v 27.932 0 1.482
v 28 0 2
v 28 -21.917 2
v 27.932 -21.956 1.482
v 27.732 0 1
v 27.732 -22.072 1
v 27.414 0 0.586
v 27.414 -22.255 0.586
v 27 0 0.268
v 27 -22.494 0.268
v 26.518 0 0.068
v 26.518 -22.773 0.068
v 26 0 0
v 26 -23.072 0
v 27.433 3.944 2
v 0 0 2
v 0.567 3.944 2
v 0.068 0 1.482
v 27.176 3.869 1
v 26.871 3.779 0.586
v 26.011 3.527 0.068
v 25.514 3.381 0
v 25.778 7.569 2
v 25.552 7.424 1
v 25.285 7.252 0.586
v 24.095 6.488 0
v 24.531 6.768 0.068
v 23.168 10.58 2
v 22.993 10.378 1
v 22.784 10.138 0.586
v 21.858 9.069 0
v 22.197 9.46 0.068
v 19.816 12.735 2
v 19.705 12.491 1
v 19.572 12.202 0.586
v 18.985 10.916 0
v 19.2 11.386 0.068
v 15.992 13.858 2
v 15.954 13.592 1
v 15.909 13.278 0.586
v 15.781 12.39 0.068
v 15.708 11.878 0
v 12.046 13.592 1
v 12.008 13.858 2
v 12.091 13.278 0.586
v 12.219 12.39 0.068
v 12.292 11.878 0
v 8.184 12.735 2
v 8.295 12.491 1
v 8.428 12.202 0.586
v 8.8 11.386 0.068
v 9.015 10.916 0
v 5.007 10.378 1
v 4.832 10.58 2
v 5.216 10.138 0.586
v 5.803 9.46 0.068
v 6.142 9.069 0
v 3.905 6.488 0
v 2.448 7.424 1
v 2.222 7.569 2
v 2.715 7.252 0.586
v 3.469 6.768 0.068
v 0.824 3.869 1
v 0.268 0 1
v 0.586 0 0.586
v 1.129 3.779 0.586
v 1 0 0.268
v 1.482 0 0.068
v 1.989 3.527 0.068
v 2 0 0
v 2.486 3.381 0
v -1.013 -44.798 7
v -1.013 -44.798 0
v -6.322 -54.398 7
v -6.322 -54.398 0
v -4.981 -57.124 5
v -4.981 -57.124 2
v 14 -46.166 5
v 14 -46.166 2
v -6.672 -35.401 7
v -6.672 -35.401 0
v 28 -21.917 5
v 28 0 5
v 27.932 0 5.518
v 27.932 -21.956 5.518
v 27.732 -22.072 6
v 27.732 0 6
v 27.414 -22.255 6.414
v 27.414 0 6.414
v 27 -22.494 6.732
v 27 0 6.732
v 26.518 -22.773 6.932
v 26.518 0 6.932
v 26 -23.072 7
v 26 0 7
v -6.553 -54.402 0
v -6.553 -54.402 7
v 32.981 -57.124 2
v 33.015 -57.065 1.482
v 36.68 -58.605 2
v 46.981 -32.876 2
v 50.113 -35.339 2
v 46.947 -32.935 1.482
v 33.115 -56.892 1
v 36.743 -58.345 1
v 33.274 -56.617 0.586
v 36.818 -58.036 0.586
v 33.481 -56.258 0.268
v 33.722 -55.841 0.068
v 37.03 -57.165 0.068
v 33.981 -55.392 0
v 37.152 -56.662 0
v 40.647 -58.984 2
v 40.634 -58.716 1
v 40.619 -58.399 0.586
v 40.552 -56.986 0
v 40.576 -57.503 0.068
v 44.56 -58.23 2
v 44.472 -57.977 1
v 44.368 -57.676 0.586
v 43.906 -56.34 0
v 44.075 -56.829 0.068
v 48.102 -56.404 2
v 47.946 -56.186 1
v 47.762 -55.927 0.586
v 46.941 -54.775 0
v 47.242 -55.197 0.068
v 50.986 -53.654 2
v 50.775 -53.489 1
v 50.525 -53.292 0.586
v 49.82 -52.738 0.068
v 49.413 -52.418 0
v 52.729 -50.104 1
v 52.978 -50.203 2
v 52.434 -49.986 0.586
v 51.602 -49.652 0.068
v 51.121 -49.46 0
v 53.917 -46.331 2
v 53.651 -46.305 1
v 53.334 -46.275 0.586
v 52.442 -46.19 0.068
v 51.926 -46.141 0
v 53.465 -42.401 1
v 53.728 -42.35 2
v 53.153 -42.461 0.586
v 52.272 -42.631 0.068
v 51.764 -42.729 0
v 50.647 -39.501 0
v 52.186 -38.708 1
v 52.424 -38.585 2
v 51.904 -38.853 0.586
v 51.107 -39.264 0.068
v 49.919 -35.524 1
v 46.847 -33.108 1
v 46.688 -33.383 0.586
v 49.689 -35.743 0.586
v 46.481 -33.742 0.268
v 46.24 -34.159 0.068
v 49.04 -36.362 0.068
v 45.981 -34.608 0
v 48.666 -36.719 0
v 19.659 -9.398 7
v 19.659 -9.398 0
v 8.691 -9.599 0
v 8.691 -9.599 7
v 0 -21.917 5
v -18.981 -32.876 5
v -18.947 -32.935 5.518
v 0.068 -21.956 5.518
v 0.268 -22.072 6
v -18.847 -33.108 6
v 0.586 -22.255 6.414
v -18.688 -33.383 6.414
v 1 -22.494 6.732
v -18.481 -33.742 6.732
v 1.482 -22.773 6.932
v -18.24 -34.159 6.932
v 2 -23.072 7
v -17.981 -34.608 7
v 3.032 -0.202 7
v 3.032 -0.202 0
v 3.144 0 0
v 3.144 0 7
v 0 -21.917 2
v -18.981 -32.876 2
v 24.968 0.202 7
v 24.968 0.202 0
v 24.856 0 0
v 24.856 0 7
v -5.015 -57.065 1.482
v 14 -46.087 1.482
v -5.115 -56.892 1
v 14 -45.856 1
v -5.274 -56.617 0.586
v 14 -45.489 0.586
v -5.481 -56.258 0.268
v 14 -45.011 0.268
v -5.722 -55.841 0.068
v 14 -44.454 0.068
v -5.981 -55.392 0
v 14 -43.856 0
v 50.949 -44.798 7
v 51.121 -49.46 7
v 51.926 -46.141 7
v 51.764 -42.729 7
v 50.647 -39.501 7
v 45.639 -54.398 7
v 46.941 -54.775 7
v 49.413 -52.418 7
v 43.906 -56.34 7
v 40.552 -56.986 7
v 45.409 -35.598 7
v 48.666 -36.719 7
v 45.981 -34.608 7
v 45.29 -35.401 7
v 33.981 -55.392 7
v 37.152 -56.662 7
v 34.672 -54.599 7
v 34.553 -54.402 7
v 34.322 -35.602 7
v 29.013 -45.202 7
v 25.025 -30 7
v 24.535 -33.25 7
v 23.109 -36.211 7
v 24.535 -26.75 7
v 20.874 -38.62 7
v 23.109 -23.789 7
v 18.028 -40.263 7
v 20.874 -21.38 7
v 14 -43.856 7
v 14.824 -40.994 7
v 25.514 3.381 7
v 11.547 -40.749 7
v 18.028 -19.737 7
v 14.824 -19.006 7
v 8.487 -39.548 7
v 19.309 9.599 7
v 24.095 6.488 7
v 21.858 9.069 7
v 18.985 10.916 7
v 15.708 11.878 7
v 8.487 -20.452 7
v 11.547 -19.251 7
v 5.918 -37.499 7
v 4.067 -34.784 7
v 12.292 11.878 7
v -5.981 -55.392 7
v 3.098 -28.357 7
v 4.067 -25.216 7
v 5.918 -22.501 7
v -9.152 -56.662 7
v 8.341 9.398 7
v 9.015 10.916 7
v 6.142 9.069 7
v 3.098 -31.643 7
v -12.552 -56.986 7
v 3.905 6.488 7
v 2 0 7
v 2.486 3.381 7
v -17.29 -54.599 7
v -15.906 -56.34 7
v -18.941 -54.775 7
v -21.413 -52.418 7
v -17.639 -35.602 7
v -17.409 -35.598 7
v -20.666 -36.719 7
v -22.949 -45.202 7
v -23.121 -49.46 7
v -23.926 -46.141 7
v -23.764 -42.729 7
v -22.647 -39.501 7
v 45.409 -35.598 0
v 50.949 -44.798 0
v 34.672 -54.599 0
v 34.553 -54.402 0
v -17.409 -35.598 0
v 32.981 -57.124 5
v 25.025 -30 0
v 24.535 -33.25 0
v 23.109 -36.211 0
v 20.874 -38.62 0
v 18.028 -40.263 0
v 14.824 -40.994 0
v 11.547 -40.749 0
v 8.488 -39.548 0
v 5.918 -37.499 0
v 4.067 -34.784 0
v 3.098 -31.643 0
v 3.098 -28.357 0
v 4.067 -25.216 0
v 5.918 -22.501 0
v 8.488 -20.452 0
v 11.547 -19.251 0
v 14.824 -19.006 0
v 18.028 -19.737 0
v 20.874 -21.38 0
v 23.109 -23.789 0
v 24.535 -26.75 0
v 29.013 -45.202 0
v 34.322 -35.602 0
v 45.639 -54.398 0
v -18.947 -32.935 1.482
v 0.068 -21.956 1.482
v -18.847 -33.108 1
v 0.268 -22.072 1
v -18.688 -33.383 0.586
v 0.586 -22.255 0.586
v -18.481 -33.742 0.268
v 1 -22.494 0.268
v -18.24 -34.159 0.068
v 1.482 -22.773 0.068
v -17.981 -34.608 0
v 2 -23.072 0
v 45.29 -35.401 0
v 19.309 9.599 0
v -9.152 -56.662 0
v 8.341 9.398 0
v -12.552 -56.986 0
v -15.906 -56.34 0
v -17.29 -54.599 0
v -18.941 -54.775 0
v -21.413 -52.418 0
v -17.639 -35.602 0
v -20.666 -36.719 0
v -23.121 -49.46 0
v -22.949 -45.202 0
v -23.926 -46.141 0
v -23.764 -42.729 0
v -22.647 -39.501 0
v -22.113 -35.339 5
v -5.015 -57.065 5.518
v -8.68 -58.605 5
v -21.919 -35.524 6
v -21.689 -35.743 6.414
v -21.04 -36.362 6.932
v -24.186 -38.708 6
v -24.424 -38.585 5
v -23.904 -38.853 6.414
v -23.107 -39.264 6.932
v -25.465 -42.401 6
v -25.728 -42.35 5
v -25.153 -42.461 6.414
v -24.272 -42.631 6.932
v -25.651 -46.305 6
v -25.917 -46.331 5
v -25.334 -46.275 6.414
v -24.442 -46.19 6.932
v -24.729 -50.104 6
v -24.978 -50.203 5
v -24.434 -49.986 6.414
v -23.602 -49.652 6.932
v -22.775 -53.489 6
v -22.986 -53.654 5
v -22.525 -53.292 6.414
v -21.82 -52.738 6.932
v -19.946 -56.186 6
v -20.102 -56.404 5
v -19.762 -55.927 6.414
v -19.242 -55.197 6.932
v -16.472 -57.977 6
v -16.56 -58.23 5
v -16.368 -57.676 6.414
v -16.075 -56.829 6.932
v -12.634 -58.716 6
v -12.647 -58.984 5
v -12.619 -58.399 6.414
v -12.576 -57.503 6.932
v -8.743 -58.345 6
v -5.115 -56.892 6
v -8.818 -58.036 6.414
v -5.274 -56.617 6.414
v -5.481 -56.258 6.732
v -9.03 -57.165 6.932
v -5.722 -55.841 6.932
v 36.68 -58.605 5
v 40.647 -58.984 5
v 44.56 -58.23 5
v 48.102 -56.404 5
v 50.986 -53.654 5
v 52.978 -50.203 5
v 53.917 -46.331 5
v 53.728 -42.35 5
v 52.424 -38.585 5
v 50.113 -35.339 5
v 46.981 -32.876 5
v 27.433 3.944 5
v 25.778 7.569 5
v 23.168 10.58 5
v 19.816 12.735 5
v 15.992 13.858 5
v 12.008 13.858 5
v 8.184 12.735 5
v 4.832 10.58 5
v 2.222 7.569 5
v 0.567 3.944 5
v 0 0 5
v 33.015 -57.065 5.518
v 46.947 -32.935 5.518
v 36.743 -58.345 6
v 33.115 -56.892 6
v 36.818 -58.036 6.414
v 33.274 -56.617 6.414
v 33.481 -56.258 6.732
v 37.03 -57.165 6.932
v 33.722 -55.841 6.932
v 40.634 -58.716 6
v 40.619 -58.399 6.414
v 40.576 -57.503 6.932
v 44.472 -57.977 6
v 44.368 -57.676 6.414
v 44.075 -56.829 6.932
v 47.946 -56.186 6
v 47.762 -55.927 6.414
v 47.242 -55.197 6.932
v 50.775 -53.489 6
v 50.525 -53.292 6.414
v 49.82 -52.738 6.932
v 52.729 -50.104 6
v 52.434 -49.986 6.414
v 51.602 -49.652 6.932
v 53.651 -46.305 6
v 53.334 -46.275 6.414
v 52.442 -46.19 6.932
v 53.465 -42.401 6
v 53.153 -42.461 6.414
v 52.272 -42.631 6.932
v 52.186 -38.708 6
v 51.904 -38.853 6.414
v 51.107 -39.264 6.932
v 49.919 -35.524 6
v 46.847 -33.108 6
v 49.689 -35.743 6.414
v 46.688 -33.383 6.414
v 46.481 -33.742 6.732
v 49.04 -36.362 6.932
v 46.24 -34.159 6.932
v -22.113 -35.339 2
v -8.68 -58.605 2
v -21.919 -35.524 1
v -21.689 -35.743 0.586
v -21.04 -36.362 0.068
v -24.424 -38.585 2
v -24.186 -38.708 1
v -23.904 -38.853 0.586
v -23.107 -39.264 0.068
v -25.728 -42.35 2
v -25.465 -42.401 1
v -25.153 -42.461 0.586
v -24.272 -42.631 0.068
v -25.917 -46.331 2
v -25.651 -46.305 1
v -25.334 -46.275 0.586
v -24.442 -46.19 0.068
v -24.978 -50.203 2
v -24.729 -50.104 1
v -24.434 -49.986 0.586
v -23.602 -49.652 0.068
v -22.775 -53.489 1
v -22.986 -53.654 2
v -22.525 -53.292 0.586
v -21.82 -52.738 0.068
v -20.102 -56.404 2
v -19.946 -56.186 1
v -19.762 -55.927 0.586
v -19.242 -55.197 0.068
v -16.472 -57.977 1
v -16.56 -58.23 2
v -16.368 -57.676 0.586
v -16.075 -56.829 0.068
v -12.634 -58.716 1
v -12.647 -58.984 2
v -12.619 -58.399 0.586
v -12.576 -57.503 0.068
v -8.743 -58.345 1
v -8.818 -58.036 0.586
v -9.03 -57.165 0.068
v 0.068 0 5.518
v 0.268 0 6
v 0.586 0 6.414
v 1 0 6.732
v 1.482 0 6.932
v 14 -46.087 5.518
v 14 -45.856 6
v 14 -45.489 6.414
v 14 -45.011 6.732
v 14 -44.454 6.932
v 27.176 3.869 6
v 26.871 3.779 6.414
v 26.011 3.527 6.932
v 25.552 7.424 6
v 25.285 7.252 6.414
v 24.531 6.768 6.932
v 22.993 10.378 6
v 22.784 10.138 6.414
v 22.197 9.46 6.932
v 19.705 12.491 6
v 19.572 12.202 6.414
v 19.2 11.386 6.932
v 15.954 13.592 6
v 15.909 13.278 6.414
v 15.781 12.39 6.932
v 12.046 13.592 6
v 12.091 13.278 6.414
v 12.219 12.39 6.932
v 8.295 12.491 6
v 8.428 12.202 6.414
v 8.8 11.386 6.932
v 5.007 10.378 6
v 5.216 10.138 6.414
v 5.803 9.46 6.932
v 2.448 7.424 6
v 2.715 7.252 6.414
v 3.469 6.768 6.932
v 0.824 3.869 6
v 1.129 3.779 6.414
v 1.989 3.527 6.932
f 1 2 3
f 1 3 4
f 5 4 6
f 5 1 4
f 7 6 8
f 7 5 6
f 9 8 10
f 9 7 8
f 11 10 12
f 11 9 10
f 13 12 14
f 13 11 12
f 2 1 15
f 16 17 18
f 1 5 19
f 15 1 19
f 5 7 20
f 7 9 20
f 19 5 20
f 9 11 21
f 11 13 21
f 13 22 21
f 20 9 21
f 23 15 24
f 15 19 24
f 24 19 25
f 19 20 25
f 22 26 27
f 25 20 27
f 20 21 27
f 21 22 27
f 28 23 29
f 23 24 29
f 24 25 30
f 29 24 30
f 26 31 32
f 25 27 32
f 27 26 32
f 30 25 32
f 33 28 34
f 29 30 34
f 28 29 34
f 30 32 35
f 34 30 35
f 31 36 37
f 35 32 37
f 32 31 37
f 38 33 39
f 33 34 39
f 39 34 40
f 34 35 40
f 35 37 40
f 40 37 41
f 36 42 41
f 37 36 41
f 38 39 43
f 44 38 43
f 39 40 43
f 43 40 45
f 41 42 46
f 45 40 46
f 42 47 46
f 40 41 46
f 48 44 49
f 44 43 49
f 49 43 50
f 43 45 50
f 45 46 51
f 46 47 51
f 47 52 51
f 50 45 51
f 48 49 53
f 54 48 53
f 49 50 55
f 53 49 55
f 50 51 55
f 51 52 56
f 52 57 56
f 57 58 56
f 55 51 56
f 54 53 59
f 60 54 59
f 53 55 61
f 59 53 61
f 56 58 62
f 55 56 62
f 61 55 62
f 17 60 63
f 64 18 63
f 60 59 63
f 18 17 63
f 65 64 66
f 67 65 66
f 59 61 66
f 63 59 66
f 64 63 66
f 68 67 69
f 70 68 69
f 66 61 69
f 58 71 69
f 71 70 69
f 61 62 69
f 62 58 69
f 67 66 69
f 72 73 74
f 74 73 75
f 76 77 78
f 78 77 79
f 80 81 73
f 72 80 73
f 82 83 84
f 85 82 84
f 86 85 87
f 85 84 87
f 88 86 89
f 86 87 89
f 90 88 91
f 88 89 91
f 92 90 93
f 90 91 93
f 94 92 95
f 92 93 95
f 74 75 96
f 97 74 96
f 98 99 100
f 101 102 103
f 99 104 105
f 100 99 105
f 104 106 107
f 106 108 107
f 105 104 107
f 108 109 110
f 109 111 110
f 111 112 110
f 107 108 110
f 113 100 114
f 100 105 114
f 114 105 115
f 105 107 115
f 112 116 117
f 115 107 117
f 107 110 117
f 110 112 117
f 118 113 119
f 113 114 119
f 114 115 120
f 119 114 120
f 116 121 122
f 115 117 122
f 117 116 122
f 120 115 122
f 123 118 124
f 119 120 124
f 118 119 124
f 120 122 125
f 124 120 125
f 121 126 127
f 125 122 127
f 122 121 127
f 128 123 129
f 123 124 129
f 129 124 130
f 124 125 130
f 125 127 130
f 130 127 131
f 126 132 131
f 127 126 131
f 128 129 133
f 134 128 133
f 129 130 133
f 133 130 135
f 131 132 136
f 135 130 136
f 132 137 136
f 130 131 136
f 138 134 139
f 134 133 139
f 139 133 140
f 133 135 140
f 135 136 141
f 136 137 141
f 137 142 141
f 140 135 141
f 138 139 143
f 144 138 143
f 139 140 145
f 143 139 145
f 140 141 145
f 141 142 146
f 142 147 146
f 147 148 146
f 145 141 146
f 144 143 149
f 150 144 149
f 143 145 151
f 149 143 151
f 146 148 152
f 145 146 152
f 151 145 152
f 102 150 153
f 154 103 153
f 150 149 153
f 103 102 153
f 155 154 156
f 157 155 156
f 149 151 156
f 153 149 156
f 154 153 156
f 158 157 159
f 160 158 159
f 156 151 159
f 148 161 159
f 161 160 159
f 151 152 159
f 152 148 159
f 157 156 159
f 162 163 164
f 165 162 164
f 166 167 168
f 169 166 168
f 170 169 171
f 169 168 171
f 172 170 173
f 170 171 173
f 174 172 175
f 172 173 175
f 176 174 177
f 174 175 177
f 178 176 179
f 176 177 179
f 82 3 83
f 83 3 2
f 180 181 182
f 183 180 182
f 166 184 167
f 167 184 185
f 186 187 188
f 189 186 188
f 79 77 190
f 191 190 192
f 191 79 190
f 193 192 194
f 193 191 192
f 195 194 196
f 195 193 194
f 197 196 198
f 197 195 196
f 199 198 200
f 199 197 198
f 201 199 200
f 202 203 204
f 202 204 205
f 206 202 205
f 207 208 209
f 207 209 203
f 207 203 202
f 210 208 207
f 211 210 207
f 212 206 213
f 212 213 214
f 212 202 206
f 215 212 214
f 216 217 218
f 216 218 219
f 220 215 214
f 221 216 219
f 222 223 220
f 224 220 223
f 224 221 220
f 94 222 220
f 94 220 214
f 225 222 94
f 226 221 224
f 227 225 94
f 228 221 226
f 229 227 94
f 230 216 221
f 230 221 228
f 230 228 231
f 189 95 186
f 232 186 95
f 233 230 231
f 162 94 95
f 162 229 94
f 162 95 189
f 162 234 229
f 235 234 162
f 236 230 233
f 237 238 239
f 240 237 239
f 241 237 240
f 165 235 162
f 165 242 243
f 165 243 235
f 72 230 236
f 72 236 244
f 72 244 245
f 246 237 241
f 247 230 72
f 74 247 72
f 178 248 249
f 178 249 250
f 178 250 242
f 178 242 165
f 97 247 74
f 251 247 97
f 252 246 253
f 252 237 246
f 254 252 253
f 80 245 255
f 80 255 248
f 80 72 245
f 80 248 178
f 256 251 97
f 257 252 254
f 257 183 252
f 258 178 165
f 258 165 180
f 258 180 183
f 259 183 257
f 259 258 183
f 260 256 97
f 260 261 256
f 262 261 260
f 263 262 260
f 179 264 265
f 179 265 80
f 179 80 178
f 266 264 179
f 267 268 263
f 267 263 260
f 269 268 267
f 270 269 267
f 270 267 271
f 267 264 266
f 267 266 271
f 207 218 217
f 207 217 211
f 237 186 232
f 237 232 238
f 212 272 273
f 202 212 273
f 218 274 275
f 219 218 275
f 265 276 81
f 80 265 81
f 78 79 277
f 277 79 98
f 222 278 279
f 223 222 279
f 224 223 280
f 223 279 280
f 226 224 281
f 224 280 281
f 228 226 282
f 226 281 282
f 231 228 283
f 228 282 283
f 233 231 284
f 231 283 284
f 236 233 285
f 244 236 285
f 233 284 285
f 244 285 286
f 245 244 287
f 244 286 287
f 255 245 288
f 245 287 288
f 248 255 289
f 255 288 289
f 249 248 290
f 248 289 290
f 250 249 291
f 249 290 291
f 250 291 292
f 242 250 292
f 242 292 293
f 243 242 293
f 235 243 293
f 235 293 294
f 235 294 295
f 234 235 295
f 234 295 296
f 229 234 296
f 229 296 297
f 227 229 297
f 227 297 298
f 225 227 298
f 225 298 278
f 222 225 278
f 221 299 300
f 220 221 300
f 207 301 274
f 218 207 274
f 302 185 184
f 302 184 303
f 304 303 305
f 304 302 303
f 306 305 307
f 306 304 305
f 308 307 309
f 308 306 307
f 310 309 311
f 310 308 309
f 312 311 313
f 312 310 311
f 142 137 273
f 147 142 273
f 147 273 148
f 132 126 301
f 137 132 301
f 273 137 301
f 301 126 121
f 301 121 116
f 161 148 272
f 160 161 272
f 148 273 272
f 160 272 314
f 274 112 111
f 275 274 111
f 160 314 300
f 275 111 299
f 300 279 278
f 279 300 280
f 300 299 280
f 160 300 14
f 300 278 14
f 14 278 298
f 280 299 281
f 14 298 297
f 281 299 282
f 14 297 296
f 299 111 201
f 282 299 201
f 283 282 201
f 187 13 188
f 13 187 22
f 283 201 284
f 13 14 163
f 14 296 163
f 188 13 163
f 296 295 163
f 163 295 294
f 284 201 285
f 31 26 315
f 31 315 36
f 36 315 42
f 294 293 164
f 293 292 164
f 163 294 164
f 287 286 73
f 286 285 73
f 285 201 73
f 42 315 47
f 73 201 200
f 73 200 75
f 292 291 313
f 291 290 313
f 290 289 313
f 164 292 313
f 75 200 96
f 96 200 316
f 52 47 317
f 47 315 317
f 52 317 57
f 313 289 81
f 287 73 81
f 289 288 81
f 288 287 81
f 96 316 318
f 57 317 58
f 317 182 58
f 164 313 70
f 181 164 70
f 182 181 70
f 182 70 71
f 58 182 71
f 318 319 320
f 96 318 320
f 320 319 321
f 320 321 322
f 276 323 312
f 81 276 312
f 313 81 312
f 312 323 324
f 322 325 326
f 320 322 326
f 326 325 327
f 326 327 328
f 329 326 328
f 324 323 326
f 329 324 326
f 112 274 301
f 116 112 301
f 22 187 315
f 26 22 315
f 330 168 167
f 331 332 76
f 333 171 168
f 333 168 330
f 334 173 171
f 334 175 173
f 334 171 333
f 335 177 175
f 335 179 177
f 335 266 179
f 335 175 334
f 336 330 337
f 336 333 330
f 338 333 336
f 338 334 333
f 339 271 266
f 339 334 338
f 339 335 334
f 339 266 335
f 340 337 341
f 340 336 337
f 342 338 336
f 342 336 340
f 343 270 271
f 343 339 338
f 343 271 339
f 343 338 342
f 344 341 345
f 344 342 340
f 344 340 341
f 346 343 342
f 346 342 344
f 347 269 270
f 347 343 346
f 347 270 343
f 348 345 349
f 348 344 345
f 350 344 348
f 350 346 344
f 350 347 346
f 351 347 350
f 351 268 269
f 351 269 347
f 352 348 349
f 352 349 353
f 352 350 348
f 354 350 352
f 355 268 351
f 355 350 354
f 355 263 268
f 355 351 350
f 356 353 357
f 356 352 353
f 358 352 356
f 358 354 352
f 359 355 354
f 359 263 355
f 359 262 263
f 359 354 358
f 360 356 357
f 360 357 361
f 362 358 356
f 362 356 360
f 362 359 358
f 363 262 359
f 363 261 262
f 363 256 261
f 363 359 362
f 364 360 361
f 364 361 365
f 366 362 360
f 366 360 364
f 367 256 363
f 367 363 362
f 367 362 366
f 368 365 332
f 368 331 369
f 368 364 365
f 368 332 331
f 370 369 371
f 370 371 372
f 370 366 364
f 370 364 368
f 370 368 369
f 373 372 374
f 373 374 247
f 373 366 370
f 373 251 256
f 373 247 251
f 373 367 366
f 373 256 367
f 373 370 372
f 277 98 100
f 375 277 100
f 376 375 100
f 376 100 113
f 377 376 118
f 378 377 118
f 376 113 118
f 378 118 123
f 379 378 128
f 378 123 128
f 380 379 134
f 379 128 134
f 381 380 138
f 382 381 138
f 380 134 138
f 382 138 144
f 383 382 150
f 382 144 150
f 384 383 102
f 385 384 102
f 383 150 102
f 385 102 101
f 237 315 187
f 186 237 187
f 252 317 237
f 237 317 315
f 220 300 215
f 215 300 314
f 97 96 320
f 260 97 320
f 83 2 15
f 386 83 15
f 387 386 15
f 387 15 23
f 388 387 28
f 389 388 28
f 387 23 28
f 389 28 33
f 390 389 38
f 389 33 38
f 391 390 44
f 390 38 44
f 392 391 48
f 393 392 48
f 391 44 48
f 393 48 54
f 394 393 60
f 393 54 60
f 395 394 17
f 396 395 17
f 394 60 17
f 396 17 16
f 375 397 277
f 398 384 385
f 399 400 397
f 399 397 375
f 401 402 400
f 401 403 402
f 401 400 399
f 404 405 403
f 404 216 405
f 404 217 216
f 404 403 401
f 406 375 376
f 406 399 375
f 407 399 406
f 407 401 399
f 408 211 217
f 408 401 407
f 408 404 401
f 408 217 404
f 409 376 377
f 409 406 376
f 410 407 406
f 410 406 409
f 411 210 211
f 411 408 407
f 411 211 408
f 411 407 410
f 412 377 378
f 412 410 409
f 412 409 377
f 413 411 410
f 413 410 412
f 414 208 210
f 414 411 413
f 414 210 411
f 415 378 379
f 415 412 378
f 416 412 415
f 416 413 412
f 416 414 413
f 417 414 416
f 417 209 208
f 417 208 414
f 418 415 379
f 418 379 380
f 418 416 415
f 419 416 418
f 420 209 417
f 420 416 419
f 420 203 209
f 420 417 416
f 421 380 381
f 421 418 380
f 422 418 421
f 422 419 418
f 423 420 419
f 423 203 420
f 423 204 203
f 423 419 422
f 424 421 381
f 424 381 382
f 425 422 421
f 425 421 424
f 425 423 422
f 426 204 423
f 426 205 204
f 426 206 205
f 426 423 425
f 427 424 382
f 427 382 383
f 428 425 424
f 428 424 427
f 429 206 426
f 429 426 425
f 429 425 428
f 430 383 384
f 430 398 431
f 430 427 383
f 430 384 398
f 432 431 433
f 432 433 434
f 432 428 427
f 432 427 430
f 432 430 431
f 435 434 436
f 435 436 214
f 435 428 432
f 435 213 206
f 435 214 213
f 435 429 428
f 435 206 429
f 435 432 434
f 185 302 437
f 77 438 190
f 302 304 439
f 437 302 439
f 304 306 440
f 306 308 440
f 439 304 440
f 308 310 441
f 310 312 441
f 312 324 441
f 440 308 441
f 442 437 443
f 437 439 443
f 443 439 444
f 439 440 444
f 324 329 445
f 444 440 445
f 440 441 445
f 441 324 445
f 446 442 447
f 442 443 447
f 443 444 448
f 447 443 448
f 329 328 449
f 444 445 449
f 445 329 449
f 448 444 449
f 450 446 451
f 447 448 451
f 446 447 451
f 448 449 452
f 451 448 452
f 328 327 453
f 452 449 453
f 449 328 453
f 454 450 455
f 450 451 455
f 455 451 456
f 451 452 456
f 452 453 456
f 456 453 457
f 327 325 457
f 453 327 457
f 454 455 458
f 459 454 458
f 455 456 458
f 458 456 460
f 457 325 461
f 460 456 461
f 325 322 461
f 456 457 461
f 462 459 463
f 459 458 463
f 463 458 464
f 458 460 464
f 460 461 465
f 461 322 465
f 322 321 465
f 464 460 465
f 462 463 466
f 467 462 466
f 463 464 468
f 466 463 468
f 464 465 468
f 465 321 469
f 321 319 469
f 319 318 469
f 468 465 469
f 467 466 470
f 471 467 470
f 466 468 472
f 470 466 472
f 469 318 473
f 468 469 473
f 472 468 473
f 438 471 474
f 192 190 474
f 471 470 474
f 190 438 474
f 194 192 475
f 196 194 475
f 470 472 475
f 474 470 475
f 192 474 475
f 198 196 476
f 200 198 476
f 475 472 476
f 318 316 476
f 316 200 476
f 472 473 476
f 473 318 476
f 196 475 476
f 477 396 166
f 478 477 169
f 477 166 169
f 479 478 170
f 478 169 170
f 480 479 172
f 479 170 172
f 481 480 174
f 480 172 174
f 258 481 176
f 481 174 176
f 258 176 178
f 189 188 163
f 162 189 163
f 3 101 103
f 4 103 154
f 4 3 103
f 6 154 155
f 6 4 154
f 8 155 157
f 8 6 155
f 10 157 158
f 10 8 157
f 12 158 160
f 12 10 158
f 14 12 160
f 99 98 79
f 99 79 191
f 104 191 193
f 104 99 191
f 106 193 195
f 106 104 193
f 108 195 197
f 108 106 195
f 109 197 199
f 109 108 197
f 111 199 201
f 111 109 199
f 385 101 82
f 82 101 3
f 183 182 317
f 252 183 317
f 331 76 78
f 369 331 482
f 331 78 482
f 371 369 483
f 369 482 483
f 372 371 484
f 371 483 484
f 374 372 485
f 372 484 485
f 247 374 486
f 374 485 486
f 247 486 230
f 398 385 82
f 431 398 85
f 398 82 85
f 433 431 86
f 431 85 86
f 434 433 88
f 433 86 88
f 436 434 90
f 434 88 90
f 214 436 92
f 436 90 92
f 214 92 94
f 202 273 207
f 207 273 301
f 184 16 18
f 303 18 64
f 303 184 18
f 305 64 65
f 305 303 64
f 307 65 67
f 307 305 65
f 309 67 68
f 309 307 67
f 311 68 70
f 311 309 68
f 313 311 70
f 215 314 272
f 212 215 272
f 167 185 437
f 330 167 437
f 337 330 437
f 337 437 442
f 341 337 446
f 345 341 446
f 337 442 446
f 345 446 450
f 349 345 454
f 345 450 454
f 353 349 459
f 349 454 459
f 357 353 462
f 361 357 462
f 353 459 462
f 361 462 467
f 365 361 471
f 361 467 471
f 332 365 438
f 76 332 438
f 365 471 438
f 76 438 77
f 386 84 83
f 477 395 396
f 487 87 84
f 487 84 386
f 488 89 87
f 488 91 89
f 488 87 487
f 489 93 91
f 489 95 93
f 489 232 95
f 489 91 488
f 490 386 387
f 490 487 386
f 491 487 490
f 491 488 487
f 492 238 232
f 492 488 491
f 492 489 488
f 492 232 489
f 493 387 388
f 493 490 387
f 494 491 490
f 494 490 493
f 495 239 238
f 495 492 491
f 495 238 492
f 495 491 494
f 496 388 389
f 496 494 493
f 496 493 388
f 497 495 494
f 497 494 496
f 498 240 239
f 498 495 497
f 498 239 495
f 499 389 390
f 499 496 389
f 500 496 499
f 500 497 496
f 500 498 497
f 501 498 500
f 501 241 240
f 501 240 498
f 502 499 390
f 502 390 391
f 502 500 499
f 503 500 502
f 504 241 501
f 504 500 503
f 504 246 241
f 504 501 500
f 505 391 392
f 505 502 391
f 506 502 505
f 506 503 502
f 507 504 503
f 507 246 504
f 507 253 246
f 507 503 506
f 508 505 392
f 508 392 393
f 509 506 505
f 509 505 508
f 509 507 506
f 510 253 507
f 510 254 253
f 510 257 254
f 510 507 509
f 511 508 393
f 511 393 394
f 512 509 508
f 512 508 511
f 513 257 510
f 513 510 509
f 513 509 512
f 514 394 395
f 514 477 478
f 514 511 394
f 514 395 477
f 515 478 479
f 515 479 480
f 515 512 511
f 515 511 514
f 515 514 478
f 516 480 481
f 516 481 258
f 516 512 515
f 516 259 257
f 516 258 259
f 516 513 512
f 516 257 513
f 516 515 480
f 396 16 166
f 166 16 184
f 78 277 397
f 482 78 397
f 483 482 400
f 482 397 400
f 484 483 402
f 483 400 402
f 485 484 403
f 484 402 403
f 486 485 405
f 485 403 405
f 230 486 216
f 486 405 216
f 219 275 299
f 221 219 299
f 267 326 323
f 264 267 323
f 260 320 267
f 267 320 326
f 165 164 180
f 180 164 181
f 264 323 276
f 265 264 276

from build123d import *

# Parameters (mm, degrees)
F1_DEPTH = 7
F2_R     = 2
F3_COUNT = 3


with BuildPart() as f1:
    # F0 (on Top) → F1 (new body)
    with BuildSketch(Plane.XY):
        with BuildLine():
            ThreePointArc((28, 0), (14, 14), (0, 0))
            Line((0, 0), (3.1437343742, 0))
            Line((3.1437343742, 0), (8.3414580162, 9.3975654268))
            Line((8.3414580162, 9.3975654268), (19.3092594014, 9.5992238198))
            Line((19.3092594014, 9.5992238198), (24.9678013852, 0.201658393))
            Line((24.9678013852, 0.201658393), (24.8562656258, 0))
            Line((24.8562656258, 0), (28, 0))
        make_face()
        with BuildLine():
            Line((3.1437343742, 0), (0, 0))
            ThreePointArc((0, 0), (14, -14), (28, 0))
            Line((28, 0), (24.8562656258, 0))
            Line((24.8562656258, 0), (19.6585419838, -9.3975654268))
            Line((19.6585419838, -9.3975654268), (8.6907405986, -9.5992238198))
            Line((8.6907405986, -9.5992238198), (3.0321986148, -0.201658393))
            Line((3.0321986148, -0.201658393), (3.1437343742, 0))
        make_face()
        with BuildLine():
            ThreePointArc((28, 0), (14, -14), (0, 0))
            Line((0, 0), (0, -30))
            ThreePointArc((0, -30), (14, -16), (28, -30))
            Line((28, -30), (28, 0))
        make_face()
        with BuildLine():
            Line((2.975, -30), (0, -30))
            ThreePointArc((0, -30), (14, -44), (28, -30))
            Line((28, -30), (25.025, -30))
            ThreePointArc((25.025, -30), (14, -41.025), (2.975, -30))
        make_face()
        with BuildLine():
            ThreePointArc((28, -30), (14, -16), (0, -30))
            Line((0, -30), (2.975, -30))
            ThreePointArc((2.975, -30), (14, -18.975), (25.025, -30))
            Line((25.025, -30), (28, -30))
        make_face()
    extrude(amount=F1_DEPTH)

    # F2
    f2_edges = [f1.edges().sort_by_distance(p)[0] for p in [
        (28, -15, 7),
        (14, 14, 7),
        (0, -15, 0),
        (14, -44, 0),
        (0, -15, 7),
        (14, -44, 7),
        (14, 14, 0),
        (28, -15, 0),
    ]]
    fillet(f2_edges, radius=F2_R)

    # F3: F1 ×3 about axis
    f3_axis = Axis((14, -30, 7), (0, 0, -1))


with BuildPart() as f1_1:
    add(f1.part)
    for i in range(1, F3_COUNT):
        add(f1.part.rotate(f3_axis, i * 360 / F3_COUNT))


solid = f1_1.part
